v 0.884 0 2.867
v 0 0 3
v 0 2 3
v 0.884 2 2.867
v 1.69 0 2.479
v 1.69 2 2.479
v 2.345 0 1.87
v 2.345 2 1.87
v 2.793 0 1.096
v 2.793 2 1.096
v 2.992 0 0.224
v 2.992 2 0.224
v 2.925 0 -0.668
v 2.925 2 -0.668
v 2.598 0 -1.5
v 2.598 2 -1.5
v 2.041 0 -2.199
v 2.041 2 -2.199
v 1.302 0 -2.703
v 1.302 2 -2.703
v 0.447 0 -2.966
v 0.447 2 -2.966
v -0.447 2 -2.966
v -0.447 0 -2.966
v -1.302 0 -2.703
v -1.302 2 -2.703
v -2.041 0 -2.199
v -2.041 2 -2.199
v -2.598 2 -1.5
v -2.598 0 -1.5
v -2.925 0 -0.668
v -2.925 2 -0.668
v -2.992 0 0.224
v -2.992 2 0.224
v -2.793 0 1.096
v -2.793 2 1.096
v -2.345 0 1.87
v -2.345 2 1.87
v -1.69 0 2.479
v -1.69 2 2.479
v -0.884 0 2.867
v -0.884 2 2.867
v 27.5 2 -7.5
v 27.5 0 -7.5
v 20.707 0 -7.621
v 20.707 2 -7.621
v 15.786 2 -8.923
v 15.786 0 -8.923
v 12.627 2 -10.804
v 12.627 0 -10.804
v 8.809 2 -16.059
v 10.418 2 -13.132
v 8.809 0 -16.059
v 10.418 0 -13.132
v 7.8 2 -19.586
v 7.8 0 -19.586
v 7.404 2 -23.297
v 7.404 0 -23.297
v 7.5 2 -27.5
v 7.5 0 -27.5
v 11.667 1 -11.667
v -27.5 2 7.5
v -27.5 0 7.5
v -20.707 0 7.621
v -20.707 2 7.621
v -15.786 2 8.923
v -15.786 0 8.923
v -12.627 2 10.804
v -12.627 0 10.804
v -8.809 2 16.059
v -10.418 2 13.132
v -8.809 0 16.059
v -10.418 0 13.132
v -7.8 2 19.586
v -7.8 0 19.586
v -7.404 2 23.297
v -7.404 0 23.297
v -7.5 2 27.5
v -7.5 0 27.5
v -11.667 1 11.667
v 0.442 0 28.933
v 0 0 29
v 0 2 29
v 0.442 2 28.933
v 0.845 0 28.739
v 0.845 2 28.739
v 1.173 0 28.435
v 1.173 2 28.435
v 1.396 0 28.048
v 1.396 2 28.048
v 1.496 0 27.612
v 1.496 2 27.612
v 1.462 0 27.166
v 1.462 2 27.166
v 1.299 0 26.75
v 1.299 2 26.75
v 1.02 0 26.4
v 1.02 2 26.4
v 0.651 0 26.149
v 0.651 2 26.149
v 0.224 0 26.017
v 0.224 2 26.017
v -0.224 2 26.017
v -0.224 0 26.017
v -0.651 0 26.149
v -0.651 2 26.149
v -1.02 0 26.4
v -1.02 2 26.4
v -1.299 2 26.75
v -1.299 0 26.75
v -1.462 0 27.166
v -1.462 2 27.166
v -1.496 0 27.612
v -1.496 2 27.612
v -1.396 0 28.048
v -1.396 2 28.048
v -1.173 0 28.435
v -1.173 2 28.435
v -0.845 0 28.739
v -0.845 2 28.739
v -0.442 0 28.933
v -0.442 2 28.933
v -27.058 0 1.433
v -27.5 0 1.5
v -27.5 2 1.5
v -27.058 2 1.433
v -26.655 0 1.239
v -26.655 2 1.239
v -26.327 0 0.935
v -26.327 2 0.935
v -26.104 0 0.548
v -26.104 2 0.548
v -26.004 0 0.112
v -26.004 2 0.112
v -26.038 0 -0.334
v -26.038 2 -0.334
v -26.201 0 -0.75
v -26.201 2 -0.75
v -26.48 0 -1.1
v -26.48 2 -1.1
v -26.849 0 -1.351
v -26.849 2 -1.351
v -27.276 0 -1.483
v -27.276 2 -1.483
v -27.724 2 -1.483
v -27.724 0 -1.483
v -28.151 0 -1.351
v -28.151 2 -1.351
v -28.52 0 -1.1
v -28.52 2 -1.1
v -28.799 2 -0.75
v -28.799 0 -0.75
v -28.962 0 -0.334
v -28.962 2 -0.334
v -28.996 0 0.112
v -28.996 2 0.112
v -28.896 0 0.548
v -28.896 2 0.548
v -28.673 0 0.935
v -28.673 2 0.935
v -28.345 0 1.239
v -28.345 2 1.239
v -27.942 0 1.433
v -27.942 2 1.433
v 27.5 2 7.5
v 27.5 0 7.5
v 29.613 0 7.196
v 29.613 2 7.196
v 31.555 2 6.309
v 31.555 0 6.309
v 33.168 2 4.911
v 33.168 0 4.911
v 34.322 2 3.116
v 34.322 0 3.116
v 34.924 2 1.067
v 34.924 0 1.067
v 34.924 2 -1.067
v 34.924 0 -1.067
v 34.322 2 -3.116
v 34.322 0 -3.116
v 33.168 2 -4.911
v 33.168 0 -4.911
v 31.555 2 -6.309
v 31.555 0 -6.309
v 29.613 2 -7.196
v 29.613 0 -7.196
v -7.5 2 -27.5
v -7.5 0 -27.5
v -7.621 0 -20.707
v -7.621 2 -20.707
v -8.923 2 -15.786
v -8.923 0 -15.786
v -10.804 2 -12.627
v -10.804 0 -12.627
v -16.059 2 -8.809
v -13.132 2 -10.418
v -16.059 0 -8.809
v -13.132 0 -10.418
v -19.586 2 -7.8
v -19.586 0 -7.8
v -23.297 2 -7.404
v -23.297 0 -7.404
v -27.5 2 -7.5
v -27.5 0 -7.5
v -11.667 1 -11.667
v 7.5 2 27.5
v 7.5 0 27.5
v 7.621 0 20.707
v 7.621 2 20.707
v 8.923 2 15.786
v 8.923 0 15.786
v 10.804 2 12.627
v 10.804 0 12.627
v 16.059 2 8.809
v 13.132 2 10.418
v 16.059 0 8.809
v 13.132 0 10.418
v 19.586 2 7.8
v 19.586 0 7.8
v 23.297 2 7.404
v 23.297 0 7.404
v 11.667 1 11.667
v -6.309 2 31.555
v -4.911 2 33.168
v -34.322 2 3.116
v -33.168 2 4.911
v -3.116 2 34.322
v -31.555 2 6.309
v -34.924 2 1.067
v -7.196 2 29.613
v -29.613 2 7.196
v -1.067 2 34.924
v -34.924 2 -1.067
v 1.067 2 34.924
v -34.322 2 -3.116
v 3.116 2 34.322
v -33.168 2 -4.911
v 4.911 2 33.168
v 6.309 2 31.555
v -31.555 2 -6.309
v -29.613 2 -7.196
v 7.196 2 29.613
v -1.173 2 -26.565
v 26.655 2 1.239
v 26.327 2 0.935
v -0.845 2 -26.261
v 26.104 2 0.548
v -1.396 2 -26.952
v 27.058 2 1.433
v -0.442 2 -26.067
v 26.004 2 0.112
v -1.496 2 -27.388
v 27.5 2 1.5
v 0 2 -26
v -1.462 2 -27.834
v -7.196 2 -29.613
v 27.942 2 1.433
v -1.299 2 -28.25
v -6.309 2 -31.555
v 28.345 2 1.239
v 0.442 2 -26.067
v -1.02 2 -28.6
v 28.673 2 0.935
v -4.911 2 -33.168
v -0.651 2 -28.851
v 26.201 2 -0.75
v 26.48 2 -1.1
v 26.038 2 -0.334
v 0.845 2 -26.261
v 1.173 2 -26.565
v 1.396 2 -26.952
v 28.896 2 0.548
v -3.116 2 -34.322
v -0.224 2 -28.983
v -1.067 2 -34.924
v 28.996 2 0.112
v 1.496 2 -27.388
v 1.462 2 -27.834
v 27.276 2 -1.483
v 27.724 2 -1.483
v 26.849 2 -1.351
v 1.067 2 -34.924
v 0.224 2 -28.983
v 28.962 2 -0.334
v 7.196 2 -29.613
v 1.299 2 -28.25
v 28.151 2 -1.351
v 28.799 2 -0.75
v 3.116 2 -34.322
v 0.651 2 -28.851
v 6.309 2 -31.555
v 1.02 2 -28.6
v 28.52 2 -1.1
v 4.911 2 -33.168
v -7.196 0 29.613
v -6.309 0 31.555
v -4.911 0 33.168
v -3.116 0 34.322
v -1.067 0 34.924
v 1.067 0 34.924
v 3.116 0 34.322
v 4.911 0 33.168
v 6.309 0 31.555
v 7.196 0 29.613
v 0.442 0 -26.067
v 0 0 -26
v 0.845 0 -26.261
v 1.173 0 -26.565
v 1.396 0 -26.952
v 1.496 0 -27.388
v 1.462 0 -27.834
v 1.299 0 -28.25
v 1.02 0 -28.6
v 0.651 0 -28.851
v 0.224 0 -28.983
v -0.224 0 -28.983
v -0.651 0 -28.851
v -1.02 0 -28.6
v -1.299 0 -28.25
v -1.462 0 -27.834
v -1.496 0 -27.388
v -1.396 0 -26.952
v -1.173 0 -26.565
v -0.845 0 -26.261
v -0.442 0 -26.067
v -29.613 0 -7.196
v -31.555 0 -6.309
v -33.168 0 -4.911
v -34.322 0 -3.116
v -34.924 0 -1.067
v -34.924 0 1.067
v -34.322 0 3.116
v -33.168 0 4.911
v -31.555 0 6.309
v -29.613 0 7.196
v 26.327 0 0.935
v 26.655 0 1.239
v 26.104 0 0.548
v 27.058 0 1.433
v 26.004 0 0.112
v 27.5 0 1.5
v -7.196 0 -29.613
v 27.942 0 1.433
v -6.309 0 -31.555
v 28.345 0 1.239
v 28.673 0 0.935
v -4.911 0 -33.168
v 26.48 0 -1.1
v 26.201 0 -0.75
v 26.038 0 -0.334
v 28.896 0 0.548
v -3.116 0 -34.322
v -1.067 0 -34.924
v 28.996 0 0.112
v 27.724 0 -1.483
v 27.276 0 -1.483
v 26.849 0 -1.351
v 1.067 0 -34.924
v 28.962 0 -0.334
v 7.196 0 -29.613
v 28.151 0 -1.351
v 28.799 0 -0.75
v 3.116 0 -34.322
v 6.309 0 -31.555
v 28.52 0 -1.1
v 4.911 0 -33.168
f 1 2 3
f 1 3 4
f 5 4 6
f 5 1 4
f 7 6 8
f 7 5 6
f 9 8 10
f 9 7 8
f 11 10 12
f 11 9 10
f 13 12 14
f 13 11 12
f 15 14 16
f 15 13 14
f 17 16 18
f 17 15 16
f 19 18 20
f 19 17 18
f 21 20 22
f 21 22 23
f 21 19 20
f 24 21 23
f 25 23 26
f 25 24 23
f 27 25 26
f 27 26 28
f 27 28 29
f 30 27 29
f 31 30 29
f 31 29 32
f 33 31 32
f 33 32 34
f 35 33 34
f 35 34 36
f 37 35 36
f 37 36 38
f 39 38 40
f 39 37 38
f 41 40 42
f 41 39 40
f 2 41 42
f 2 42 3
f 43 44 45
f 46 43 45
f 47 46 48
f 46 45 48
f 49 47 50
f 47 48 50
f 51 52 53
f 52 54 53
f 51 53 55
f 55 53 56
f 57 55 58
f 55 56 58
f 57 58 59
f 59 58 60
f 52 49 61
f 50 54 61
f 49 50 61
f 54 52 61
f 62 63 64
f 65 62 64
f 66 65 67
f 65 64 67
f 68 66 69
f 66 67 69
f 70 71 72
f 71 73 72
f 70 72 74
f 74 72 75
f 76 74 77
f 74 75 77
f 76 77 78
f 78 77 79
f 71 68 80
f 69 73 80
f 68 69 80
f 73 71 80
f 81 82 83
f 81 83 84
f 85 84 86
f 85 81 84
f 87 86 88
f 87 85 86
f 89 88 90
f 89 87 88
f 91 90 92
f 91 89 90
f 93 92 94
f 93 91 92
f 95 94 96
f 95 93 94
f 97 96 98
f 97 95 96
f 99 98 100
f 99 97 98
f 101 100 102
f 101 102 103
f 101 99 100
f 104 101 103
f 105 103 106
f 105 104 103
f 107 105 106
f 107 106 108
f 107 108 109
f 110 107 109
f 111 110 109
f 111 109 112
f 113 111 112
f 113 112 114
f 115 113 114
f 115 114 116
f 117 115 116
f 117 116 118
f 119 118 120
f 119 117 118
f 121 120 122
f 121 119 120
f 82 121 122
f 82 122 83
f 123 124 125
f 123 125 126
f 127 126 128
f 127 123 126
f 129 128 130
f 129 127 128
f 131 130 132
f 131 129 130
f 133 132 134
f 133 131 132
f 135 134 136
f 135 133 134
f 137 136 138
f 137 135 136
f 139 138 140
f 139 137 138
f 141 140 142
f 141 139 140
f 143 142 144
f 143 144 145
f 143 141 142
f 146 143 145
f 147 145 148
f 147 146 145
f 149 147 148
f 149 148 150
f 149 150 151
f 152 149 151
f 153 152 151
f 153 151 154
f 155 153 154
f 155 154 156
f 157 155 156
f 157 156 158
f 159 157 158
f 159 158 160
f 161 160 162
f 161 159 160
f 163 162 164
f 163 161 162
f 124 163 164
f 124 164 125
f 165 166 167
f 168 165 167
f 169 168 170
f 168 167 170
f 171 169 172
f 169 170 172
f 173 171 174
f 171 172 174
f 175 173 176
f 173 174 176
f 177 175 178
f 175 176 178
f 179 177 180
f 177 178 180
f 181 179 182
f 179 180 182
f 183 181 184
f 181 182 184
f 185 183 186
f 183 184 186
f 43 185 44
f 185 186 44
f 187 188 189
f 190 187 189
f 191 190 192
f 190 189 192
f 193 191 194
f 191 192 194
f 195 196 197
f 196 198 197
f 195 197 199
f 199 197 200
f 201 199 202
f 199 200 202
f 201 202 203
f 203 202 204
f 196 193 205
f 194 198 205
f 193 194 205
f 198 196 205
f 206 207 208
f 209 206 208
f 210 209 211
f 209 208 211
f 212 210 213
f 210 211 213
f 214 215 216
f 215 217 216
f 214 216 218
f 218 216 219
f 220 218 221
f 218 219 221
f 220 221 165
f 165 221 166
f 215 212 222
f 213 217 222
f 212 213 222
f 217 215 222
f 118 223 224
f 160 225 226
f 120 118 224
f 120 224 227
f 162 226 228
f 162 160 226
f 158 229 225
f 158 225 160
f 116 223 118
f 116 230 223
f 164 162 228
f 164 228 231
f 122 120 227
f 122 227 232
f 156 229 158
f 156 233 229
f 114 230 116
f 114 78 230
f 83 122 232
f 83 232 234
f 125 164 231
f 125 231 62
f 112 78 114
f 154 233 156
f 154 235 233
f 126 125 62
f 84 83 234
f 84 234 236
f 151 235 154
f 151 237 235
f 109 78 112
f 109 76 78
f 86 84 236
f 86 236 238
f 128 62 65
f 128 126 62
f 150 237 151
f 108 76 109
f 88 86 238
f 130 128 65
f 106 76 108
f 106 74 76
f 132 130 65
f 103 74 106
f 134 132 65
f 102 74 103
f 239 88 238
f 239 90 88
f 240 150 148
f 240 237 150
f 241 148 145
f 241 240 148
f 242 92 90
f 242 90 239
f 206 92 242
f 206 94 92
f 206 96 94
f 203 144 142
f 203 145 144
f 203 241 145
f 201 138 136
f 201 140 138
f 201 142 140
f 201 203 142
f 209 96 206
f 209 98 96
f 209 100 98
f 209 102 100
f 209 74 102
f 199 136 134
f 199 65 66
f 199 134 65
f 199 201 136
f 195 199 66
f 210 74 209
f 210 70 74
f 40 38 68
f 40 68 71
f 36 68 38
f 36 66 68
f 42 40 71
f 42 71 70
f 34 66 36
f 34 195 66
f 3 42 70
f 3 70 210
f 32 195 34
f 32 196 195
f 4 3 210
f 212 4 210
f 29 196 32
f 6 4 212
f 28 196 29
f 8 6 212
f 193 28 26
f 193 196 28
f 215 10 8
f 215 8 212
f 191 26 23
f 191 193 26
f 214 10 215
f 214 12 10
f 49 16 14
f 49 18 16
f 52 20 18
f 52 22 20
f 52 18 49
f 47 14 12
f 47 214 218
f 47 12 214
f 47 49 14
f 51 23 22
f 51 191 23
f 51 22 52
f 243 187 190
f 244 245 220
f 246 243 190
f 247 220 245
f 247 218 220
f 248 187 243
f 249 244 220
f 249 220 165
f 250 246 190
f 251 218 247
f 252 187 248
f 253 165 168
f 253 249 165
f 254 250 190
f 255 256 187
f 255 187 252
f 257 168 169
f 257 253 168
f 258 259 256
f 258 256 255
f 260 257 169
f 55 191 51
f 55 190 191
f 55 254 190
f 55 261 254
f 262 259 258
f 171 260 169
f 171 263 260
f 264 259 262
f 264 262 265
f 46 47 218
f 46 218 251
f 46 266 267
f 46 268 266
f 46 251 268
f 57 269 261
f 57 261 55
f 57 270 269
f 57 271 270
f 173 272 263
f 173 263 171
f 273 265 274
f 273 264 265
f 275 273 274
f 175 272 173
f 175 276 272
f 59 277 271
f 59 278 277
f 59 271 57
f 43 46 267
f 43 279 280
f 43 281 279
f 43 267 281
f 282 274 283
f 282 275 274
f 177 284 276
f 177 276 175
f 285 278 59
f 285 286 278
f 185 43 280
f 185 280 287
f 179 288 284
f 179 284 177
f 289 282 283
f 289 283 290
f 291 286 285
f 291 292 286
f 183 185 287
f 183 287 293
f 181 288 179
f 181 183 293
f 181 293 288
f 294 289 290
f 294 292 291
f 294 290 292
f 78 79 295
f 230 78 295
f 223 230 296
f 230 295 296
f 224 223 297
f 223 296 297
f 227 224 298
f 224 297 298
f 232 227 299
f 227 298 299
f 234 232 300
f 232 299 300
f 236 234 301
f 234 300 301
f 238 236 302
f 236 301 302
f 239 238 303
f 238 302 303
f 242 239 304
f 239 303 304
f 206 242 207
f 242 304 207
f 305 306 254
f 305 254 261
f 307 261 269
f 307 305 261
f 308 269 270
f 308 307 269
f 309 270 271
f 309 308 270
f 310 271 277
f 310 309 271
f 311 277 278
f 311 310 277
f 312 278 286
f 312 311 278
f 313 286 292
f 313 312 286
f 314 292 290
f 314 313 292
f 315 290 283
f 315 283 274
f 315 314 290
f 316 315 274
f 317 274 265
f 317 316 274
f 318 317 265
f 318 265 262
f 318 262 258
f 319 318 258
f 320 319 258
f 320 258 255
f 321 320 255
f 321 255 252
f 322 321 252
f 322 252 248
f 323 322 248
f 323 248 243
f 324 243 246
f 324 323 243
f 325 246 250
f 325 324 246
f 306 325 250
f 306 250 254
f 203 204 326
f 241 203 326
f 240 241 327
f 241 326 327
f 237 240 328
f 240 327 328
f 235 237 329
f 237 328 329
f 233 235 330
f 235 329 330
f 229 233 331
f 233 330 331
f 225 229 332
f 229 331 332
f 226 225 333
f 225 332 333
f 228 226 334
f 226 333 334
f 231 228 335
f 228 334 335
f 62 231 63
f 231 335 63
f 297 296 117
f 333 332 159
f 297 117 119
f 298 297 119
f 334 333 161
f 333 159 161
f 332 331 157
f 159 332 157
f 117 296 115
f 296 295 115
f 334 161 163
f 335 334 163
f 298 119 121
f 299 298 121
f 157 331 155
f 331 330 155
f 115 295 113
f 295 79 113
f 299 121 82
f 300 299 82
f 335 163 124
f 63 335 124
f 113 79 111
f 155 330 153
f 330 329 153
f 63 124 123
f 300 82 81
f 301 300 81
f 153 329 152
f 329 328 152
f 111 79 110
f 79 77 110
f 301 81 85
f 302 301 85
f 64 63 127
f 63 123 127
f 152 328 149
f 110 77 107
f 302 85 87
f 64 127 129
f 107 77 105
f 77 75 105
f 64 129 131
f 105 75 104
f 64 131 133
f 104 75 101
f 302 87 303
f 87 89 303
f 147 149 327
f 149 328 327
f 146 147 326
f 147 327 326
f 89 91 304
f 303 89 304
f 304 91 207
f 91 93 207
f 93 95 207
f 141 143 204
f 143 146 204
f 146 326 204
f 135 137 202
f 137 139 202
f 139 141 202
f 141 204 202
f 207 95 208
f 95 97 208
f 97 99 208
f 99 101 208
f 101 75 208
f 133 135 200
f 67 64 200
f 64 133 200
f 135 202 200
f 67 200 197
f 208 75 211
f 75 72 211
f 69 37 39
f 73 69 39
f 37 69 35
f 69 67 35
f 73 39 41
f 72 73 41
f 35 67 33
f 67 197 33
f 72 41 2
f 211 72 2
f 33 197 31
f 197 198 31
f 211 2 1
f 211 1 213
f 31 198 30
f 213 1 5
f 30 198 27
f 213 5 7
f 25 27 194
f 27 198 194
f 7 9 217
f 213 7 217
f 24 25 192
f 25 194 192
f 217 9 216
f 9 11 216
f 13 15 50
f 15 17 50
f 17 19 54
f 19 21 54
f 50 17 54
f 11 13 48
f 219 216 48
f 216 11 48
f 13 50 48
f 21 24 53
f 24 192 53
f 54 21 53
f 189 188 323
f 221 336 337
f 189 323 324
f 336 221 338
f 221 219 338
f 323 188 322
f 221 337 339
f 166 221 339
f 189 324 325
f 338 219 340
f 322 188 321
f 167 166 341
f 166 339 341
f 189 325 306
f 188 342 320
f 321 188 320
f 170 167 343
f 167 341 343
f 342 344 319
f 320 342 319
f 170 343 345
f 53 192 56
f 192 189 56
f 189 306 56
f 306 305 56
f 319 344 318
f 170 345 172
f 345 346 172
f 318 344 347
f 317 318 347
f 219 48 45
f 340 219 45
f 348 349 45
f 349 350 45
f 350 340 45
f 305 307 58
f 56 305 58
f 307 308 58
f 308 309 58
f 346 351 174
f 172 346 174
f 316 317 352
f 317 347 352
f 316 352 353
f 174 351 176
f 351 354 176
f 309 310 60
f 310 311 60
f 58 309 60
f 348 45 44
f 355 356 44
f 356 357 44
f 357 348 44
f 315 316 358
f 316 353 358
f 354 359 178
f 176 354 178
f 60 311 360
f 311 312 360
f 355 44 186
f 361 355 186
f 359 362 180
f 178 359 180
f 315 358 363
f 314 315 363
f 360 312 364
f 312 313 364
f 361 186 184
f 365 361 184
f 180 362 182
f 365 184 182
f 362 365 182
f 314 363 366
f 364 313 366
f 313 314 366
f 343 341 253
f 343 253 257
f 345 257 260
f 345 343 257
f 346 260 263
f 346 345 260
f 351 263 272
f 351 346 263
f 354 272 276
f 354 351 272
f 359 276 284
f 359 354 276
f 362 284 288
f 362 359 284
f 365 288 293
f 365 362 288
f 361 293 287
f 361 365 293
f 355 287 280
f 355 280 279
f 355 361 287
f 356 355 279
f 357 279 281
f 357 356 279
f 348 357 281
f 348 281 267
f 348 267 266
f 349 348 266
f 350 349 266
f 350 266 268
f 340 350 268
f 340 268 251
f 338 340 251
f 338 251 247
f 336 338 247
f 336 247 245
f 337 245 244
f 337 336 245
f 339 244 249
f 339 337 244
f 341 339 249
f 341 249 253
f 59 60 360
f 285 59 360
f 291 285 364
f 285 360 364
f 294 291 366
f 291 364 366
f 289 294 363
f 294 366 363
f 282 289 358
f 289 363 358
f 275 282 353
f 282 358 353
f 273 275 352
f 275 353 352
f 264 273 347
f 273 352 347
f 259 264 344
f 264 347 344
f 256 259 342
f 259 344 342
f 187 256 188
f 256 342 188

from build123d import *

# Parameters (mm, degrees)
SKETCH1_R           = 1.5
SKETCH1_R_2         = 3
BOSS_EXTRUDE1_DEPTH = 2


with BuildPart() as part:
    # Sketch1 → Boss-Extrude1 (new body)
    with BuildSketch(Plane(origin=(0, 0, 0), x_dir=(1, 0, 0), z_dir=(0, 1, 0))):
        with BuildLine():
            ThreePointArc((27.5, -7.5), (35, 0), (27.5, 7.5))
            add(Edge.make_bspline(
                [(27.5, 7.5), (5.834523779, 5.834523779), (7.5, 27.5)],
                knots=[0, 0, 0, 1, 1, 1], degree=2))
            ThreePointArc((7.5, 27.5), (0, 35), (-7.5, 27.5))
            add(Edge.make_bspline(
                [(-7.5, 27.5), (-5.834523779, 5.834523779), (-27.5, 7.5)],
                knots=[0, 0, 0, 1, 1, 1], degree=2))
            ThreePointArc((-27.5, 7.5), (-35, 0), (-27.5, -7.5))
            add(Edge.make_bspline(
                [(-27.5, -7.5), (-5.834523779, -5.834523779), (-7.5, -27.5)],
                knots=[0, 0, 0, 1, 1, 1], degree=2))
            ThreePointArc((-7.5, -27.5), (0, -35), (7.5, -27.5))
            add(Edge.make_bspline(
                [(7.5, -27.5), (5.834523779, -5.834523779), (27.5, -7.5)],
                knots=[0, 0, 0, 1, 1, 1], degree=2))
        make_face()
        with Locations(Location((0, 27.5, 0), (0, 0, 270))):
            Circle(SKETCH1_R, mode=Mode.SUBTRACT)
        with Locations(Location((-27.5, 0, 0), (0, 0, 270))):
            Circle(SKETCH1_R, mode=Mode.SUBTRACT)
        with Locations(Location((27.5, 0, 0), (0, 0, 270))):
            Circle(SKETCH1_R, mode=Mode.SUBTRACT)
        with Locations(Location((0, -27.5, 0), (0, 0, 270))):
            Circle(SKETCH1_R, mode=Mode.SUBTRACT)
        with Locations(Location((0, 0, 0), (0, 0, 270))):
            Circle(SKETCH1_R_2, mode=Mode.SUBTRACT)
    extrude(amount=BOSS_EXTRUDE1_DEPTH)


solid = part.part
